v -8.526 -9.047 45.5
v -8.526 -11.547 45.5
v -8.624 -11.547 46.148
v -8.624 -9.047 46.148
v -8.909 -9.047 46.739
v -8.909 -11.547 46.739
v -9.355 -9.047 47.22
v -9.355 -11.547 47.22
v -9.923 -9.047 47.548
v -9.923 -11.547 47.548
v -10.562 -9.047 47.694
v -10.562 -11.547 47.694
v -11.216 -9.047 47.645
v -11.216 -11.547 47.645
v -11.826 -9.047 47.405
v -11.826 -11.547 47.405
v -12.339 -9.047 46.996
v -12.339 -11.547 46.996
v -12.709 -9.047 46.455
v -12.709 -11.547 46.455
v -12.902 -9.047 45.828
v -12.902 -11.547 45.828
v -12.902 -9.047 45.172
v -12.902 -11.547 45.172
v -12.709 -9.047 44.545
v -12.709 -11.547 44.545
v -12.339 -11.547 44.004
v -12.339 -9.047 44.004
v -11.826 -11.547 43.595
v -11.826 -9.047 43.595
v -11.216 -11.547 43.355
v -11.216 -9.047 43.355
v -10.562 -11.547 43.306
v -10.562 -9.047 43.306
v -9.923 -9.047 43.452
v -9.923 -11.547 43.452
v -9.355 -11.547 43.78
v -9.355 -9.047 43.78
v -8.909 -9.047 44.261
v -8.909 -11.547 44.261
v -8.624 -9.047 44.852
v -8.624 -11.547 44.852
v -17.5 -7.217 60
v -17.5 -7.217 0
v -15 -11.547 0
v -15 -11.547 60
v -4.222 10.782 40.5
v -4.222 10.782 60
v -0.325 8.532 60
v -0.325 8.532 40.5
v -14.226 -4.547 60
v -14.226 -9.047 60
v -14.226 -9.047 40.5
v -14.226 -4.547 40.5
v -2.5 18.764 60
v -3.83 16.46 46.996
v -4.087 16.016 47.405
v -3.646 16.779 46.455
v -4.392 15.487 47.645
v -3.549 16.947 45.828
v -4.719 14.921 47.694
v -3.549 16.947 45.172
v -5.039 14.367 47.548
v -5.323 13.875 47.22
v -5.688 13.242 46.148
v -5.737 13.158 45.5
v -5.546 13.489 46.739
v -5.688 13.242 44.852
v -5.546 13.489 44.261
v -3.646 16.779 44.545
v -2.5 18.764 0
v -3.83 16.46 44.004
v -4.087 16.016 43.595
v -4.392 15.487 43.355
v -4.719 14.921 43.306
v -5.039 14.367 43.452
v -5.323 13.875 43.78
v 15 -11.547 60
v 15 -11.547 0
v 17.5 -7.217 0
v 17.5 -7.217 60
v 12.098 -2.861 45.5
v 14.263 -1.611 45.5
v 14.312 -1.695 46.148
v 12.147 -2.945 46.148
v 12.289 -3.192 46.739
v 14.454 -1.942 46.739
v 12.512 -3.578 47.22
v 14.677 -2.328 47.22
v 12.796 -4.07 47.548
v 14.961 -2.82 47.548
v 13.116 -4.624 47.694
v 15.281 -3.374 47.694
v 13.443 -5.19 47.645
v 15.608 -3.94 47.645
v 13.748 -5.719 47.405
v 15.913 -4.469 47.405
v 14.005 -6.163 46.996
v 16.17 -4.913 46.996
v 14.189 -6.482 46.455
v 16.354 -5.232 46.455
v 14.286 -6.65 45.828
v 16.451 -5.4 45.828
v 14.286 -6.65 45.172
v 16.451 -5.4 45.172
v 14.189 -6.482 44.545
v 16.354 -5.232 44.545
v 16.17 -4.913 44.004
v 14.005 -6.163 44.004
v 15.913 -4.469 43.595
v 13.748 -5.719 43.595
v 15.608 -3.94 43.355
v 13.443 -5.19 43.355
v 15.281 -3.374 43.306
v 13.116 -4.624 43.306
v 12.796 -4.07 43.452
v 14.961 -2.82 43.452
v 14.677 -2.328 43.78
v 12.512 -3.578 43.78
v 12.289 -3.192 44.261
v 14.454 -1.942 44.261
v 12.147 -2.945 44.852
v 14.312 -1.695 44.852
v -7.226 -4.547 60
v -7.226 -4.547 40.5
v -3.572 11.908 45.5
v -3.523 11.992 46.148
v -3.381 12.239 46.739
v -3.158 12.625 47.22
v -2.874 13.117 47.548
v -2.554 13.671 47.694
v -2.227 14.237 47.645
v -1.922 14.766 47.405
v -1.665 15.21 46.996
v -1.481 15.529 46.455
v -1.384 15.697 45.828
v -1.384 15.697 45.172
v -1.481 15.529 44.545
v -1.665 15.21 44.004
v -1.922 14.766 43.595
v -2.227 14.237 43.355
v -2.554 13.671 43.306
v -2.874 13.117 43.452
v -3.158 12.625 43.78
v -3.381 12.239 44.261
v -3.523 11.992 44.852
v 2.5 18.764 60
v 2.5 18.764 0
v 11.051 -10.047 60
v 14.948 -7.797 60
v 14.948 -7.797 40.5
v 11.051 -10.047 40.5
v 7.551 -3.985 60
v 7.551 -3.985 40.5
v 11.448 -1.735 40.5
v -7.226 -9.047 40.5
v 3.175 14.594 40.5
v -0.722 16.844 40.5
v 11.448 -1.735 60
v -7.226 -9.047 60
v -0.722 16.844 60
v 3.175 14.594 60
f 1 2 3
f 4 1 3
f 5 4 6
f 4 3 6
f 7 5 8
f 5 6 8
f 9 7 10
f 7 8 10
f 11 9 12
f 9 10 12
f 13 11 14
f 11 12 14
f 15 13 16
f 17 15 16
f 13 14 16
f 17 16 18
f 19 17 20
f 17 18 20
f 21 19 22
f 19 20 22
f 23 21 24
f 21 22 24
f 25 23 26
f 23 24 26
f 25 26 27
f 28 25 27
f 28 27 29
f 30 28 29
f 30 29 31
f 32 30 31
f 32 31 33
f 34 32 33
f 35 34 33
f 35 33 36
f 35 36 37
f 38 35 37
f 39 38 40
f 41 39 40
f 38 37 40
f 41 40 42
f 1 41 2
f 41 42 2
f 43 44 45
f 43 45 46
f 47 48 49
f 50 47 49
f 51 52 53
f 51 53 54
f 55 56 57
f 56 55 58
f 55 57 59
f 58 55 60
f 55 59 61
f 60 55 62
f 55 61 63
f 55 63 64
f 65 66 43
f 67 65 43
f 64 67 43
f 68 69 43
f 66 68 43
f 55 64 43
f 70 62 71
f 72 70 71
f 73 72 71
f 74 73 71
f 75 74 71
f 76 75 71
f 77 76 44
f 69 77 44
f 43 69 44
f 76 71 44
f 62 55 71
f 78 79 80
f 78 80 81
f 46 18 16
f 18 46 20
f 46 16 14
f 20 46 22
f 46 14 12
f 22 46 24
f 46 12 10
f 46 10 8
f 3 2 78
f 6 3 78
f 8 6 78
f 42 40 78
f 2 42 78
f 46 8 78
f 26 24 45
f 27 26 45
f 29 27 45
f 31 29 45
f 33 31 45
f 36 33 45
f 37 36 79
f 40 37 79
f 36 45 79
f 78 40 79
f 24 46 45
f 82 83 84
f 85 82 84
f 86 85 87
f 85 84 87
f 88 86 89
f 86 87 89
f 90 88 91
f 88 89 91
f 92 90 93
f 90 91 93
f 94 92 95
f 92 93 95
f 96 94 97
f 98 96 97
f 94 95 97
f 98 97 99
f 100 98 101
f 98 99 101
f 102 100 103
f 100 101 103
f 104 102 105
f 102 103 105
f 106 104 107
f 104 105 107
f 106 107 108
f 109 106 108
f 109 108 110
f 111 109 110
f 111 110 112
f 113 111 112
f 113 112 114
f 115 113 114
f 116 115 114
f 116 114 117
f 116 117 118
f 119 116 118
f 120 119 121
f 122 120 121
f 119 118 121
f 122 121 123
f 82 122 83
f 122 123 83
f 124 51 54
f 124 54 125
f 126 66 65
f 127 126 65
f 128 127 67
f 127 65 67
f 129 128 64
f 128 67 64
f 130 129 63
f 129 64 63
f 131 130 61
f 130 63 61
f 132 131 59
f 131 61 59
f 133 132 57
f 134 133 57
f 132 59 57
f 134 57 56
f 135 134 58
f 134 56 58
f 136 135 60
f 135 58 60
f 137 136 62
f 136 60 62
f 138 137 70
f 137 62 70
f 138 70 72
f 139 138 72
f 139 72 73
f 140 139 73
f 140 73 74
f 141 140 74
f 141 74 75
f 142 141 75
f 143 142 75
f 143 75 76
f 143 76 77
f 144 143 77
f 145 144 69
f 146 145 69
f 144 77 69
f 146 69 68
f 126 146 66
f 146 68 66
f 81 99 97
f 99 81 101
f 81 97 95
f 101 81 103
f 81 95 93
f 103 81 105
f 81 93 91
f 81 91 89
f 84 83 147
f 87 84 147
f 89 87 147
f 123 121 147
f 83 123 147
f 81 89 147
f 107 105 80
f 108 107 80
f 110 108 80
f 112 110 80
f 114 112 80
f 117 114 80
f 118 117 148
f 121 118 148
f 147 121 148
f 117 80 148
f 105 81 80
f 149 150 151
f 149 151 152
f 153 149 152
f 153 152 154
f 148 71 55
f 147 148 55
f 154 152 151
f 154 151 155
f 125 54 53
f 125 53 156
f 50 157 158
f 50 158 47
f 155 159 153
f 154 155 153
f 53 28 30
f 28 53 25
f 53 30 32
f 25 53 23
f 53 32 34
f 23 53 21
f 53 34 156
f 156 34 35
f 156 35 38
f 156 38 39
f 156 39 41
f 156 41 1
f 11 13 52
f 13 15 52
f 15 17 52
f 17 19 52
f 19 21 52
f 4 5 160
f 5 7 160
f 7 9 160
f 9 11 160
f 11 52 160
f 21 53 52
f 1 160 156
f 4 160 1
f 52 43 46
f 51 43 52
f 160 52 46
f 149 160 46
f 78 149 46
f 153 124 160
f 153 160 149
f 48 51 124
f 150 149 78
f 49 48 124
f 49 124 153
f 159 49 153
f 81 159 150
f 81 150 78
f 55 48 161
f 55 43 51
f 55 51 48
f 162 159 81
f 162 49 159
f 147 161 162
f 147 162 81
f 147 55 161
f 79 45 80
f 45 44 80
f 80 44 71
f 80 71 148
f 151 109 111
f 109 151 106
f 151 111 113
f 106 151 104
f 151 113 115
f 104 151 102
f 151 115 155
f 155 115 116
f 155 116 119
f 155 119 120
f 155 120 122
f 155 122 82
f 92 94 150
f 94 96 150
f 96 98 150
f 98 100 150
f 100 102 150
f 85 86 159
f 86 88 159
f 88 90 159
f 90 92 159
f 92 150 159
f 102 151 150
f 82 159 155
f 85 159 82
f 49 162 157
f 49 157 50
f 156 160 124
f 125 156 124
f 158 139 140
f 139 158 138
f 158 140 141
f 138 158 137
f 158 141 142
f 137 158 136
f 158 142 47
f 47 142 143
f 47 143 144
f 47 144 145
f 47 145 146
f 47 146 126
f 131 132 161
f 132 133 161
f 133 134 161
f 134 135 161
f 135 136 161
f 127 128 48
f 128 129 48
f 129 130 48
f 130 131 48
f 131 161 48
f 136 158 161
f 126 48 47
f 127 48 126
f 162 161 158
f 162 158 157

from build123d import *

# Parameters (mm, degrees)
BOSS_EXTRUDE1_DEPTH  = 60
CHAMFER1_SIZE        = 5
CHAMFER1_EDGE_2_SIZE = 5
CHAMFER1_EDGE_3_SIZE = 5
SKETCH2_W            = 7
SKETCH2_H            = 4.5
CUT_EXTRUDE1_DEPTH   = 19.5
SKETCH3_R            = 2.2
CUT_EXTRUDE2_DEPTH   = 2.5
CIRPATTERN1_COUNT    = 3


with BuildPart() as part:
    # Sketch1 → Boss-Extrude1 (new body)
    with BuildSketch(Plane.XY):
        Polygon((-20, -11.547005384), (20, -11.547005384), (0, 23.094010768), align=None)
    extrude(amount=BOSS_EXTRUDE1_DEPTH)

    # Chamfer1
    chamfer1_edges = [part.edges().sort_by_distance(p)[0] for p in [
        (0, 23.094010768, 30),
    ]]
    chamfer(chamfer1_edges, length=CHAMFER1_SIZE)

    # Chamfer1 edge 2
    chamfer1_edge_2_edges = [part.edges().sort_by_distance(p)[0] for p in [
        (20, -11.547005384, 30),
    ]]
    chamfer(chamfer1_edge_2_edges, length=CHAMFER1_EDGE_2_SIZE)

    # Chamfer1 edge 3
    chamfer1_edge_3_edges = [part.edges().sort_by_distance(p)[0] for p in [
        (-20, -11.547005384, 30),
    ]]
    chamfer(chamfer1_edge_3_edges, length=CHAMFER1_EDGE_3_SIZE)

    # Sketch2 → Cut-Extrude1 (cut)
    with BuildSketch(Plane.XY.offset(60)):
        with Locations((-10.726497308, -6.797005384)):
            Rectangle(SKETCH2_W, SKETCH2_H)
    cut_extrude1 = extrude(amount=-CUT_EXTRUDE1_DEPTH, mode=Mode.SUBTRACT)

    # Sketch3 → Cut-Extrude2 (cut)
    with BuildSketch(Plane.XZ.offset(11.547005384)):
        with Locations((-10.726497308, 45.5)):
            Circle(SKETCH3_R)
    cut_extrude2 = extrude(amount=-CUT_EXTRUDE2_DEPTH, mode=Mode.SUBTRACT)

    # CirPattern1: Cut-Extrude1, Cut-Extrude2 ×3 about axis
    cirpattern1_axis = Axis((0, 0, 0), (0, 0, 1))
    for i in range(1, CIRPATTERN1_COUNT):
        add(cut_extrude1.rotate(cirpattern1_axis, i * 360 / CIRPATTERN1_COUNT), mode=Mode.SUBTRACT)
        add(cut_extrude2.rotate(cirpattern1_axis, i * 360 / CIRPATTERN1_COUNT), mode=Mode.SUBTRACT)


solid = part.part
